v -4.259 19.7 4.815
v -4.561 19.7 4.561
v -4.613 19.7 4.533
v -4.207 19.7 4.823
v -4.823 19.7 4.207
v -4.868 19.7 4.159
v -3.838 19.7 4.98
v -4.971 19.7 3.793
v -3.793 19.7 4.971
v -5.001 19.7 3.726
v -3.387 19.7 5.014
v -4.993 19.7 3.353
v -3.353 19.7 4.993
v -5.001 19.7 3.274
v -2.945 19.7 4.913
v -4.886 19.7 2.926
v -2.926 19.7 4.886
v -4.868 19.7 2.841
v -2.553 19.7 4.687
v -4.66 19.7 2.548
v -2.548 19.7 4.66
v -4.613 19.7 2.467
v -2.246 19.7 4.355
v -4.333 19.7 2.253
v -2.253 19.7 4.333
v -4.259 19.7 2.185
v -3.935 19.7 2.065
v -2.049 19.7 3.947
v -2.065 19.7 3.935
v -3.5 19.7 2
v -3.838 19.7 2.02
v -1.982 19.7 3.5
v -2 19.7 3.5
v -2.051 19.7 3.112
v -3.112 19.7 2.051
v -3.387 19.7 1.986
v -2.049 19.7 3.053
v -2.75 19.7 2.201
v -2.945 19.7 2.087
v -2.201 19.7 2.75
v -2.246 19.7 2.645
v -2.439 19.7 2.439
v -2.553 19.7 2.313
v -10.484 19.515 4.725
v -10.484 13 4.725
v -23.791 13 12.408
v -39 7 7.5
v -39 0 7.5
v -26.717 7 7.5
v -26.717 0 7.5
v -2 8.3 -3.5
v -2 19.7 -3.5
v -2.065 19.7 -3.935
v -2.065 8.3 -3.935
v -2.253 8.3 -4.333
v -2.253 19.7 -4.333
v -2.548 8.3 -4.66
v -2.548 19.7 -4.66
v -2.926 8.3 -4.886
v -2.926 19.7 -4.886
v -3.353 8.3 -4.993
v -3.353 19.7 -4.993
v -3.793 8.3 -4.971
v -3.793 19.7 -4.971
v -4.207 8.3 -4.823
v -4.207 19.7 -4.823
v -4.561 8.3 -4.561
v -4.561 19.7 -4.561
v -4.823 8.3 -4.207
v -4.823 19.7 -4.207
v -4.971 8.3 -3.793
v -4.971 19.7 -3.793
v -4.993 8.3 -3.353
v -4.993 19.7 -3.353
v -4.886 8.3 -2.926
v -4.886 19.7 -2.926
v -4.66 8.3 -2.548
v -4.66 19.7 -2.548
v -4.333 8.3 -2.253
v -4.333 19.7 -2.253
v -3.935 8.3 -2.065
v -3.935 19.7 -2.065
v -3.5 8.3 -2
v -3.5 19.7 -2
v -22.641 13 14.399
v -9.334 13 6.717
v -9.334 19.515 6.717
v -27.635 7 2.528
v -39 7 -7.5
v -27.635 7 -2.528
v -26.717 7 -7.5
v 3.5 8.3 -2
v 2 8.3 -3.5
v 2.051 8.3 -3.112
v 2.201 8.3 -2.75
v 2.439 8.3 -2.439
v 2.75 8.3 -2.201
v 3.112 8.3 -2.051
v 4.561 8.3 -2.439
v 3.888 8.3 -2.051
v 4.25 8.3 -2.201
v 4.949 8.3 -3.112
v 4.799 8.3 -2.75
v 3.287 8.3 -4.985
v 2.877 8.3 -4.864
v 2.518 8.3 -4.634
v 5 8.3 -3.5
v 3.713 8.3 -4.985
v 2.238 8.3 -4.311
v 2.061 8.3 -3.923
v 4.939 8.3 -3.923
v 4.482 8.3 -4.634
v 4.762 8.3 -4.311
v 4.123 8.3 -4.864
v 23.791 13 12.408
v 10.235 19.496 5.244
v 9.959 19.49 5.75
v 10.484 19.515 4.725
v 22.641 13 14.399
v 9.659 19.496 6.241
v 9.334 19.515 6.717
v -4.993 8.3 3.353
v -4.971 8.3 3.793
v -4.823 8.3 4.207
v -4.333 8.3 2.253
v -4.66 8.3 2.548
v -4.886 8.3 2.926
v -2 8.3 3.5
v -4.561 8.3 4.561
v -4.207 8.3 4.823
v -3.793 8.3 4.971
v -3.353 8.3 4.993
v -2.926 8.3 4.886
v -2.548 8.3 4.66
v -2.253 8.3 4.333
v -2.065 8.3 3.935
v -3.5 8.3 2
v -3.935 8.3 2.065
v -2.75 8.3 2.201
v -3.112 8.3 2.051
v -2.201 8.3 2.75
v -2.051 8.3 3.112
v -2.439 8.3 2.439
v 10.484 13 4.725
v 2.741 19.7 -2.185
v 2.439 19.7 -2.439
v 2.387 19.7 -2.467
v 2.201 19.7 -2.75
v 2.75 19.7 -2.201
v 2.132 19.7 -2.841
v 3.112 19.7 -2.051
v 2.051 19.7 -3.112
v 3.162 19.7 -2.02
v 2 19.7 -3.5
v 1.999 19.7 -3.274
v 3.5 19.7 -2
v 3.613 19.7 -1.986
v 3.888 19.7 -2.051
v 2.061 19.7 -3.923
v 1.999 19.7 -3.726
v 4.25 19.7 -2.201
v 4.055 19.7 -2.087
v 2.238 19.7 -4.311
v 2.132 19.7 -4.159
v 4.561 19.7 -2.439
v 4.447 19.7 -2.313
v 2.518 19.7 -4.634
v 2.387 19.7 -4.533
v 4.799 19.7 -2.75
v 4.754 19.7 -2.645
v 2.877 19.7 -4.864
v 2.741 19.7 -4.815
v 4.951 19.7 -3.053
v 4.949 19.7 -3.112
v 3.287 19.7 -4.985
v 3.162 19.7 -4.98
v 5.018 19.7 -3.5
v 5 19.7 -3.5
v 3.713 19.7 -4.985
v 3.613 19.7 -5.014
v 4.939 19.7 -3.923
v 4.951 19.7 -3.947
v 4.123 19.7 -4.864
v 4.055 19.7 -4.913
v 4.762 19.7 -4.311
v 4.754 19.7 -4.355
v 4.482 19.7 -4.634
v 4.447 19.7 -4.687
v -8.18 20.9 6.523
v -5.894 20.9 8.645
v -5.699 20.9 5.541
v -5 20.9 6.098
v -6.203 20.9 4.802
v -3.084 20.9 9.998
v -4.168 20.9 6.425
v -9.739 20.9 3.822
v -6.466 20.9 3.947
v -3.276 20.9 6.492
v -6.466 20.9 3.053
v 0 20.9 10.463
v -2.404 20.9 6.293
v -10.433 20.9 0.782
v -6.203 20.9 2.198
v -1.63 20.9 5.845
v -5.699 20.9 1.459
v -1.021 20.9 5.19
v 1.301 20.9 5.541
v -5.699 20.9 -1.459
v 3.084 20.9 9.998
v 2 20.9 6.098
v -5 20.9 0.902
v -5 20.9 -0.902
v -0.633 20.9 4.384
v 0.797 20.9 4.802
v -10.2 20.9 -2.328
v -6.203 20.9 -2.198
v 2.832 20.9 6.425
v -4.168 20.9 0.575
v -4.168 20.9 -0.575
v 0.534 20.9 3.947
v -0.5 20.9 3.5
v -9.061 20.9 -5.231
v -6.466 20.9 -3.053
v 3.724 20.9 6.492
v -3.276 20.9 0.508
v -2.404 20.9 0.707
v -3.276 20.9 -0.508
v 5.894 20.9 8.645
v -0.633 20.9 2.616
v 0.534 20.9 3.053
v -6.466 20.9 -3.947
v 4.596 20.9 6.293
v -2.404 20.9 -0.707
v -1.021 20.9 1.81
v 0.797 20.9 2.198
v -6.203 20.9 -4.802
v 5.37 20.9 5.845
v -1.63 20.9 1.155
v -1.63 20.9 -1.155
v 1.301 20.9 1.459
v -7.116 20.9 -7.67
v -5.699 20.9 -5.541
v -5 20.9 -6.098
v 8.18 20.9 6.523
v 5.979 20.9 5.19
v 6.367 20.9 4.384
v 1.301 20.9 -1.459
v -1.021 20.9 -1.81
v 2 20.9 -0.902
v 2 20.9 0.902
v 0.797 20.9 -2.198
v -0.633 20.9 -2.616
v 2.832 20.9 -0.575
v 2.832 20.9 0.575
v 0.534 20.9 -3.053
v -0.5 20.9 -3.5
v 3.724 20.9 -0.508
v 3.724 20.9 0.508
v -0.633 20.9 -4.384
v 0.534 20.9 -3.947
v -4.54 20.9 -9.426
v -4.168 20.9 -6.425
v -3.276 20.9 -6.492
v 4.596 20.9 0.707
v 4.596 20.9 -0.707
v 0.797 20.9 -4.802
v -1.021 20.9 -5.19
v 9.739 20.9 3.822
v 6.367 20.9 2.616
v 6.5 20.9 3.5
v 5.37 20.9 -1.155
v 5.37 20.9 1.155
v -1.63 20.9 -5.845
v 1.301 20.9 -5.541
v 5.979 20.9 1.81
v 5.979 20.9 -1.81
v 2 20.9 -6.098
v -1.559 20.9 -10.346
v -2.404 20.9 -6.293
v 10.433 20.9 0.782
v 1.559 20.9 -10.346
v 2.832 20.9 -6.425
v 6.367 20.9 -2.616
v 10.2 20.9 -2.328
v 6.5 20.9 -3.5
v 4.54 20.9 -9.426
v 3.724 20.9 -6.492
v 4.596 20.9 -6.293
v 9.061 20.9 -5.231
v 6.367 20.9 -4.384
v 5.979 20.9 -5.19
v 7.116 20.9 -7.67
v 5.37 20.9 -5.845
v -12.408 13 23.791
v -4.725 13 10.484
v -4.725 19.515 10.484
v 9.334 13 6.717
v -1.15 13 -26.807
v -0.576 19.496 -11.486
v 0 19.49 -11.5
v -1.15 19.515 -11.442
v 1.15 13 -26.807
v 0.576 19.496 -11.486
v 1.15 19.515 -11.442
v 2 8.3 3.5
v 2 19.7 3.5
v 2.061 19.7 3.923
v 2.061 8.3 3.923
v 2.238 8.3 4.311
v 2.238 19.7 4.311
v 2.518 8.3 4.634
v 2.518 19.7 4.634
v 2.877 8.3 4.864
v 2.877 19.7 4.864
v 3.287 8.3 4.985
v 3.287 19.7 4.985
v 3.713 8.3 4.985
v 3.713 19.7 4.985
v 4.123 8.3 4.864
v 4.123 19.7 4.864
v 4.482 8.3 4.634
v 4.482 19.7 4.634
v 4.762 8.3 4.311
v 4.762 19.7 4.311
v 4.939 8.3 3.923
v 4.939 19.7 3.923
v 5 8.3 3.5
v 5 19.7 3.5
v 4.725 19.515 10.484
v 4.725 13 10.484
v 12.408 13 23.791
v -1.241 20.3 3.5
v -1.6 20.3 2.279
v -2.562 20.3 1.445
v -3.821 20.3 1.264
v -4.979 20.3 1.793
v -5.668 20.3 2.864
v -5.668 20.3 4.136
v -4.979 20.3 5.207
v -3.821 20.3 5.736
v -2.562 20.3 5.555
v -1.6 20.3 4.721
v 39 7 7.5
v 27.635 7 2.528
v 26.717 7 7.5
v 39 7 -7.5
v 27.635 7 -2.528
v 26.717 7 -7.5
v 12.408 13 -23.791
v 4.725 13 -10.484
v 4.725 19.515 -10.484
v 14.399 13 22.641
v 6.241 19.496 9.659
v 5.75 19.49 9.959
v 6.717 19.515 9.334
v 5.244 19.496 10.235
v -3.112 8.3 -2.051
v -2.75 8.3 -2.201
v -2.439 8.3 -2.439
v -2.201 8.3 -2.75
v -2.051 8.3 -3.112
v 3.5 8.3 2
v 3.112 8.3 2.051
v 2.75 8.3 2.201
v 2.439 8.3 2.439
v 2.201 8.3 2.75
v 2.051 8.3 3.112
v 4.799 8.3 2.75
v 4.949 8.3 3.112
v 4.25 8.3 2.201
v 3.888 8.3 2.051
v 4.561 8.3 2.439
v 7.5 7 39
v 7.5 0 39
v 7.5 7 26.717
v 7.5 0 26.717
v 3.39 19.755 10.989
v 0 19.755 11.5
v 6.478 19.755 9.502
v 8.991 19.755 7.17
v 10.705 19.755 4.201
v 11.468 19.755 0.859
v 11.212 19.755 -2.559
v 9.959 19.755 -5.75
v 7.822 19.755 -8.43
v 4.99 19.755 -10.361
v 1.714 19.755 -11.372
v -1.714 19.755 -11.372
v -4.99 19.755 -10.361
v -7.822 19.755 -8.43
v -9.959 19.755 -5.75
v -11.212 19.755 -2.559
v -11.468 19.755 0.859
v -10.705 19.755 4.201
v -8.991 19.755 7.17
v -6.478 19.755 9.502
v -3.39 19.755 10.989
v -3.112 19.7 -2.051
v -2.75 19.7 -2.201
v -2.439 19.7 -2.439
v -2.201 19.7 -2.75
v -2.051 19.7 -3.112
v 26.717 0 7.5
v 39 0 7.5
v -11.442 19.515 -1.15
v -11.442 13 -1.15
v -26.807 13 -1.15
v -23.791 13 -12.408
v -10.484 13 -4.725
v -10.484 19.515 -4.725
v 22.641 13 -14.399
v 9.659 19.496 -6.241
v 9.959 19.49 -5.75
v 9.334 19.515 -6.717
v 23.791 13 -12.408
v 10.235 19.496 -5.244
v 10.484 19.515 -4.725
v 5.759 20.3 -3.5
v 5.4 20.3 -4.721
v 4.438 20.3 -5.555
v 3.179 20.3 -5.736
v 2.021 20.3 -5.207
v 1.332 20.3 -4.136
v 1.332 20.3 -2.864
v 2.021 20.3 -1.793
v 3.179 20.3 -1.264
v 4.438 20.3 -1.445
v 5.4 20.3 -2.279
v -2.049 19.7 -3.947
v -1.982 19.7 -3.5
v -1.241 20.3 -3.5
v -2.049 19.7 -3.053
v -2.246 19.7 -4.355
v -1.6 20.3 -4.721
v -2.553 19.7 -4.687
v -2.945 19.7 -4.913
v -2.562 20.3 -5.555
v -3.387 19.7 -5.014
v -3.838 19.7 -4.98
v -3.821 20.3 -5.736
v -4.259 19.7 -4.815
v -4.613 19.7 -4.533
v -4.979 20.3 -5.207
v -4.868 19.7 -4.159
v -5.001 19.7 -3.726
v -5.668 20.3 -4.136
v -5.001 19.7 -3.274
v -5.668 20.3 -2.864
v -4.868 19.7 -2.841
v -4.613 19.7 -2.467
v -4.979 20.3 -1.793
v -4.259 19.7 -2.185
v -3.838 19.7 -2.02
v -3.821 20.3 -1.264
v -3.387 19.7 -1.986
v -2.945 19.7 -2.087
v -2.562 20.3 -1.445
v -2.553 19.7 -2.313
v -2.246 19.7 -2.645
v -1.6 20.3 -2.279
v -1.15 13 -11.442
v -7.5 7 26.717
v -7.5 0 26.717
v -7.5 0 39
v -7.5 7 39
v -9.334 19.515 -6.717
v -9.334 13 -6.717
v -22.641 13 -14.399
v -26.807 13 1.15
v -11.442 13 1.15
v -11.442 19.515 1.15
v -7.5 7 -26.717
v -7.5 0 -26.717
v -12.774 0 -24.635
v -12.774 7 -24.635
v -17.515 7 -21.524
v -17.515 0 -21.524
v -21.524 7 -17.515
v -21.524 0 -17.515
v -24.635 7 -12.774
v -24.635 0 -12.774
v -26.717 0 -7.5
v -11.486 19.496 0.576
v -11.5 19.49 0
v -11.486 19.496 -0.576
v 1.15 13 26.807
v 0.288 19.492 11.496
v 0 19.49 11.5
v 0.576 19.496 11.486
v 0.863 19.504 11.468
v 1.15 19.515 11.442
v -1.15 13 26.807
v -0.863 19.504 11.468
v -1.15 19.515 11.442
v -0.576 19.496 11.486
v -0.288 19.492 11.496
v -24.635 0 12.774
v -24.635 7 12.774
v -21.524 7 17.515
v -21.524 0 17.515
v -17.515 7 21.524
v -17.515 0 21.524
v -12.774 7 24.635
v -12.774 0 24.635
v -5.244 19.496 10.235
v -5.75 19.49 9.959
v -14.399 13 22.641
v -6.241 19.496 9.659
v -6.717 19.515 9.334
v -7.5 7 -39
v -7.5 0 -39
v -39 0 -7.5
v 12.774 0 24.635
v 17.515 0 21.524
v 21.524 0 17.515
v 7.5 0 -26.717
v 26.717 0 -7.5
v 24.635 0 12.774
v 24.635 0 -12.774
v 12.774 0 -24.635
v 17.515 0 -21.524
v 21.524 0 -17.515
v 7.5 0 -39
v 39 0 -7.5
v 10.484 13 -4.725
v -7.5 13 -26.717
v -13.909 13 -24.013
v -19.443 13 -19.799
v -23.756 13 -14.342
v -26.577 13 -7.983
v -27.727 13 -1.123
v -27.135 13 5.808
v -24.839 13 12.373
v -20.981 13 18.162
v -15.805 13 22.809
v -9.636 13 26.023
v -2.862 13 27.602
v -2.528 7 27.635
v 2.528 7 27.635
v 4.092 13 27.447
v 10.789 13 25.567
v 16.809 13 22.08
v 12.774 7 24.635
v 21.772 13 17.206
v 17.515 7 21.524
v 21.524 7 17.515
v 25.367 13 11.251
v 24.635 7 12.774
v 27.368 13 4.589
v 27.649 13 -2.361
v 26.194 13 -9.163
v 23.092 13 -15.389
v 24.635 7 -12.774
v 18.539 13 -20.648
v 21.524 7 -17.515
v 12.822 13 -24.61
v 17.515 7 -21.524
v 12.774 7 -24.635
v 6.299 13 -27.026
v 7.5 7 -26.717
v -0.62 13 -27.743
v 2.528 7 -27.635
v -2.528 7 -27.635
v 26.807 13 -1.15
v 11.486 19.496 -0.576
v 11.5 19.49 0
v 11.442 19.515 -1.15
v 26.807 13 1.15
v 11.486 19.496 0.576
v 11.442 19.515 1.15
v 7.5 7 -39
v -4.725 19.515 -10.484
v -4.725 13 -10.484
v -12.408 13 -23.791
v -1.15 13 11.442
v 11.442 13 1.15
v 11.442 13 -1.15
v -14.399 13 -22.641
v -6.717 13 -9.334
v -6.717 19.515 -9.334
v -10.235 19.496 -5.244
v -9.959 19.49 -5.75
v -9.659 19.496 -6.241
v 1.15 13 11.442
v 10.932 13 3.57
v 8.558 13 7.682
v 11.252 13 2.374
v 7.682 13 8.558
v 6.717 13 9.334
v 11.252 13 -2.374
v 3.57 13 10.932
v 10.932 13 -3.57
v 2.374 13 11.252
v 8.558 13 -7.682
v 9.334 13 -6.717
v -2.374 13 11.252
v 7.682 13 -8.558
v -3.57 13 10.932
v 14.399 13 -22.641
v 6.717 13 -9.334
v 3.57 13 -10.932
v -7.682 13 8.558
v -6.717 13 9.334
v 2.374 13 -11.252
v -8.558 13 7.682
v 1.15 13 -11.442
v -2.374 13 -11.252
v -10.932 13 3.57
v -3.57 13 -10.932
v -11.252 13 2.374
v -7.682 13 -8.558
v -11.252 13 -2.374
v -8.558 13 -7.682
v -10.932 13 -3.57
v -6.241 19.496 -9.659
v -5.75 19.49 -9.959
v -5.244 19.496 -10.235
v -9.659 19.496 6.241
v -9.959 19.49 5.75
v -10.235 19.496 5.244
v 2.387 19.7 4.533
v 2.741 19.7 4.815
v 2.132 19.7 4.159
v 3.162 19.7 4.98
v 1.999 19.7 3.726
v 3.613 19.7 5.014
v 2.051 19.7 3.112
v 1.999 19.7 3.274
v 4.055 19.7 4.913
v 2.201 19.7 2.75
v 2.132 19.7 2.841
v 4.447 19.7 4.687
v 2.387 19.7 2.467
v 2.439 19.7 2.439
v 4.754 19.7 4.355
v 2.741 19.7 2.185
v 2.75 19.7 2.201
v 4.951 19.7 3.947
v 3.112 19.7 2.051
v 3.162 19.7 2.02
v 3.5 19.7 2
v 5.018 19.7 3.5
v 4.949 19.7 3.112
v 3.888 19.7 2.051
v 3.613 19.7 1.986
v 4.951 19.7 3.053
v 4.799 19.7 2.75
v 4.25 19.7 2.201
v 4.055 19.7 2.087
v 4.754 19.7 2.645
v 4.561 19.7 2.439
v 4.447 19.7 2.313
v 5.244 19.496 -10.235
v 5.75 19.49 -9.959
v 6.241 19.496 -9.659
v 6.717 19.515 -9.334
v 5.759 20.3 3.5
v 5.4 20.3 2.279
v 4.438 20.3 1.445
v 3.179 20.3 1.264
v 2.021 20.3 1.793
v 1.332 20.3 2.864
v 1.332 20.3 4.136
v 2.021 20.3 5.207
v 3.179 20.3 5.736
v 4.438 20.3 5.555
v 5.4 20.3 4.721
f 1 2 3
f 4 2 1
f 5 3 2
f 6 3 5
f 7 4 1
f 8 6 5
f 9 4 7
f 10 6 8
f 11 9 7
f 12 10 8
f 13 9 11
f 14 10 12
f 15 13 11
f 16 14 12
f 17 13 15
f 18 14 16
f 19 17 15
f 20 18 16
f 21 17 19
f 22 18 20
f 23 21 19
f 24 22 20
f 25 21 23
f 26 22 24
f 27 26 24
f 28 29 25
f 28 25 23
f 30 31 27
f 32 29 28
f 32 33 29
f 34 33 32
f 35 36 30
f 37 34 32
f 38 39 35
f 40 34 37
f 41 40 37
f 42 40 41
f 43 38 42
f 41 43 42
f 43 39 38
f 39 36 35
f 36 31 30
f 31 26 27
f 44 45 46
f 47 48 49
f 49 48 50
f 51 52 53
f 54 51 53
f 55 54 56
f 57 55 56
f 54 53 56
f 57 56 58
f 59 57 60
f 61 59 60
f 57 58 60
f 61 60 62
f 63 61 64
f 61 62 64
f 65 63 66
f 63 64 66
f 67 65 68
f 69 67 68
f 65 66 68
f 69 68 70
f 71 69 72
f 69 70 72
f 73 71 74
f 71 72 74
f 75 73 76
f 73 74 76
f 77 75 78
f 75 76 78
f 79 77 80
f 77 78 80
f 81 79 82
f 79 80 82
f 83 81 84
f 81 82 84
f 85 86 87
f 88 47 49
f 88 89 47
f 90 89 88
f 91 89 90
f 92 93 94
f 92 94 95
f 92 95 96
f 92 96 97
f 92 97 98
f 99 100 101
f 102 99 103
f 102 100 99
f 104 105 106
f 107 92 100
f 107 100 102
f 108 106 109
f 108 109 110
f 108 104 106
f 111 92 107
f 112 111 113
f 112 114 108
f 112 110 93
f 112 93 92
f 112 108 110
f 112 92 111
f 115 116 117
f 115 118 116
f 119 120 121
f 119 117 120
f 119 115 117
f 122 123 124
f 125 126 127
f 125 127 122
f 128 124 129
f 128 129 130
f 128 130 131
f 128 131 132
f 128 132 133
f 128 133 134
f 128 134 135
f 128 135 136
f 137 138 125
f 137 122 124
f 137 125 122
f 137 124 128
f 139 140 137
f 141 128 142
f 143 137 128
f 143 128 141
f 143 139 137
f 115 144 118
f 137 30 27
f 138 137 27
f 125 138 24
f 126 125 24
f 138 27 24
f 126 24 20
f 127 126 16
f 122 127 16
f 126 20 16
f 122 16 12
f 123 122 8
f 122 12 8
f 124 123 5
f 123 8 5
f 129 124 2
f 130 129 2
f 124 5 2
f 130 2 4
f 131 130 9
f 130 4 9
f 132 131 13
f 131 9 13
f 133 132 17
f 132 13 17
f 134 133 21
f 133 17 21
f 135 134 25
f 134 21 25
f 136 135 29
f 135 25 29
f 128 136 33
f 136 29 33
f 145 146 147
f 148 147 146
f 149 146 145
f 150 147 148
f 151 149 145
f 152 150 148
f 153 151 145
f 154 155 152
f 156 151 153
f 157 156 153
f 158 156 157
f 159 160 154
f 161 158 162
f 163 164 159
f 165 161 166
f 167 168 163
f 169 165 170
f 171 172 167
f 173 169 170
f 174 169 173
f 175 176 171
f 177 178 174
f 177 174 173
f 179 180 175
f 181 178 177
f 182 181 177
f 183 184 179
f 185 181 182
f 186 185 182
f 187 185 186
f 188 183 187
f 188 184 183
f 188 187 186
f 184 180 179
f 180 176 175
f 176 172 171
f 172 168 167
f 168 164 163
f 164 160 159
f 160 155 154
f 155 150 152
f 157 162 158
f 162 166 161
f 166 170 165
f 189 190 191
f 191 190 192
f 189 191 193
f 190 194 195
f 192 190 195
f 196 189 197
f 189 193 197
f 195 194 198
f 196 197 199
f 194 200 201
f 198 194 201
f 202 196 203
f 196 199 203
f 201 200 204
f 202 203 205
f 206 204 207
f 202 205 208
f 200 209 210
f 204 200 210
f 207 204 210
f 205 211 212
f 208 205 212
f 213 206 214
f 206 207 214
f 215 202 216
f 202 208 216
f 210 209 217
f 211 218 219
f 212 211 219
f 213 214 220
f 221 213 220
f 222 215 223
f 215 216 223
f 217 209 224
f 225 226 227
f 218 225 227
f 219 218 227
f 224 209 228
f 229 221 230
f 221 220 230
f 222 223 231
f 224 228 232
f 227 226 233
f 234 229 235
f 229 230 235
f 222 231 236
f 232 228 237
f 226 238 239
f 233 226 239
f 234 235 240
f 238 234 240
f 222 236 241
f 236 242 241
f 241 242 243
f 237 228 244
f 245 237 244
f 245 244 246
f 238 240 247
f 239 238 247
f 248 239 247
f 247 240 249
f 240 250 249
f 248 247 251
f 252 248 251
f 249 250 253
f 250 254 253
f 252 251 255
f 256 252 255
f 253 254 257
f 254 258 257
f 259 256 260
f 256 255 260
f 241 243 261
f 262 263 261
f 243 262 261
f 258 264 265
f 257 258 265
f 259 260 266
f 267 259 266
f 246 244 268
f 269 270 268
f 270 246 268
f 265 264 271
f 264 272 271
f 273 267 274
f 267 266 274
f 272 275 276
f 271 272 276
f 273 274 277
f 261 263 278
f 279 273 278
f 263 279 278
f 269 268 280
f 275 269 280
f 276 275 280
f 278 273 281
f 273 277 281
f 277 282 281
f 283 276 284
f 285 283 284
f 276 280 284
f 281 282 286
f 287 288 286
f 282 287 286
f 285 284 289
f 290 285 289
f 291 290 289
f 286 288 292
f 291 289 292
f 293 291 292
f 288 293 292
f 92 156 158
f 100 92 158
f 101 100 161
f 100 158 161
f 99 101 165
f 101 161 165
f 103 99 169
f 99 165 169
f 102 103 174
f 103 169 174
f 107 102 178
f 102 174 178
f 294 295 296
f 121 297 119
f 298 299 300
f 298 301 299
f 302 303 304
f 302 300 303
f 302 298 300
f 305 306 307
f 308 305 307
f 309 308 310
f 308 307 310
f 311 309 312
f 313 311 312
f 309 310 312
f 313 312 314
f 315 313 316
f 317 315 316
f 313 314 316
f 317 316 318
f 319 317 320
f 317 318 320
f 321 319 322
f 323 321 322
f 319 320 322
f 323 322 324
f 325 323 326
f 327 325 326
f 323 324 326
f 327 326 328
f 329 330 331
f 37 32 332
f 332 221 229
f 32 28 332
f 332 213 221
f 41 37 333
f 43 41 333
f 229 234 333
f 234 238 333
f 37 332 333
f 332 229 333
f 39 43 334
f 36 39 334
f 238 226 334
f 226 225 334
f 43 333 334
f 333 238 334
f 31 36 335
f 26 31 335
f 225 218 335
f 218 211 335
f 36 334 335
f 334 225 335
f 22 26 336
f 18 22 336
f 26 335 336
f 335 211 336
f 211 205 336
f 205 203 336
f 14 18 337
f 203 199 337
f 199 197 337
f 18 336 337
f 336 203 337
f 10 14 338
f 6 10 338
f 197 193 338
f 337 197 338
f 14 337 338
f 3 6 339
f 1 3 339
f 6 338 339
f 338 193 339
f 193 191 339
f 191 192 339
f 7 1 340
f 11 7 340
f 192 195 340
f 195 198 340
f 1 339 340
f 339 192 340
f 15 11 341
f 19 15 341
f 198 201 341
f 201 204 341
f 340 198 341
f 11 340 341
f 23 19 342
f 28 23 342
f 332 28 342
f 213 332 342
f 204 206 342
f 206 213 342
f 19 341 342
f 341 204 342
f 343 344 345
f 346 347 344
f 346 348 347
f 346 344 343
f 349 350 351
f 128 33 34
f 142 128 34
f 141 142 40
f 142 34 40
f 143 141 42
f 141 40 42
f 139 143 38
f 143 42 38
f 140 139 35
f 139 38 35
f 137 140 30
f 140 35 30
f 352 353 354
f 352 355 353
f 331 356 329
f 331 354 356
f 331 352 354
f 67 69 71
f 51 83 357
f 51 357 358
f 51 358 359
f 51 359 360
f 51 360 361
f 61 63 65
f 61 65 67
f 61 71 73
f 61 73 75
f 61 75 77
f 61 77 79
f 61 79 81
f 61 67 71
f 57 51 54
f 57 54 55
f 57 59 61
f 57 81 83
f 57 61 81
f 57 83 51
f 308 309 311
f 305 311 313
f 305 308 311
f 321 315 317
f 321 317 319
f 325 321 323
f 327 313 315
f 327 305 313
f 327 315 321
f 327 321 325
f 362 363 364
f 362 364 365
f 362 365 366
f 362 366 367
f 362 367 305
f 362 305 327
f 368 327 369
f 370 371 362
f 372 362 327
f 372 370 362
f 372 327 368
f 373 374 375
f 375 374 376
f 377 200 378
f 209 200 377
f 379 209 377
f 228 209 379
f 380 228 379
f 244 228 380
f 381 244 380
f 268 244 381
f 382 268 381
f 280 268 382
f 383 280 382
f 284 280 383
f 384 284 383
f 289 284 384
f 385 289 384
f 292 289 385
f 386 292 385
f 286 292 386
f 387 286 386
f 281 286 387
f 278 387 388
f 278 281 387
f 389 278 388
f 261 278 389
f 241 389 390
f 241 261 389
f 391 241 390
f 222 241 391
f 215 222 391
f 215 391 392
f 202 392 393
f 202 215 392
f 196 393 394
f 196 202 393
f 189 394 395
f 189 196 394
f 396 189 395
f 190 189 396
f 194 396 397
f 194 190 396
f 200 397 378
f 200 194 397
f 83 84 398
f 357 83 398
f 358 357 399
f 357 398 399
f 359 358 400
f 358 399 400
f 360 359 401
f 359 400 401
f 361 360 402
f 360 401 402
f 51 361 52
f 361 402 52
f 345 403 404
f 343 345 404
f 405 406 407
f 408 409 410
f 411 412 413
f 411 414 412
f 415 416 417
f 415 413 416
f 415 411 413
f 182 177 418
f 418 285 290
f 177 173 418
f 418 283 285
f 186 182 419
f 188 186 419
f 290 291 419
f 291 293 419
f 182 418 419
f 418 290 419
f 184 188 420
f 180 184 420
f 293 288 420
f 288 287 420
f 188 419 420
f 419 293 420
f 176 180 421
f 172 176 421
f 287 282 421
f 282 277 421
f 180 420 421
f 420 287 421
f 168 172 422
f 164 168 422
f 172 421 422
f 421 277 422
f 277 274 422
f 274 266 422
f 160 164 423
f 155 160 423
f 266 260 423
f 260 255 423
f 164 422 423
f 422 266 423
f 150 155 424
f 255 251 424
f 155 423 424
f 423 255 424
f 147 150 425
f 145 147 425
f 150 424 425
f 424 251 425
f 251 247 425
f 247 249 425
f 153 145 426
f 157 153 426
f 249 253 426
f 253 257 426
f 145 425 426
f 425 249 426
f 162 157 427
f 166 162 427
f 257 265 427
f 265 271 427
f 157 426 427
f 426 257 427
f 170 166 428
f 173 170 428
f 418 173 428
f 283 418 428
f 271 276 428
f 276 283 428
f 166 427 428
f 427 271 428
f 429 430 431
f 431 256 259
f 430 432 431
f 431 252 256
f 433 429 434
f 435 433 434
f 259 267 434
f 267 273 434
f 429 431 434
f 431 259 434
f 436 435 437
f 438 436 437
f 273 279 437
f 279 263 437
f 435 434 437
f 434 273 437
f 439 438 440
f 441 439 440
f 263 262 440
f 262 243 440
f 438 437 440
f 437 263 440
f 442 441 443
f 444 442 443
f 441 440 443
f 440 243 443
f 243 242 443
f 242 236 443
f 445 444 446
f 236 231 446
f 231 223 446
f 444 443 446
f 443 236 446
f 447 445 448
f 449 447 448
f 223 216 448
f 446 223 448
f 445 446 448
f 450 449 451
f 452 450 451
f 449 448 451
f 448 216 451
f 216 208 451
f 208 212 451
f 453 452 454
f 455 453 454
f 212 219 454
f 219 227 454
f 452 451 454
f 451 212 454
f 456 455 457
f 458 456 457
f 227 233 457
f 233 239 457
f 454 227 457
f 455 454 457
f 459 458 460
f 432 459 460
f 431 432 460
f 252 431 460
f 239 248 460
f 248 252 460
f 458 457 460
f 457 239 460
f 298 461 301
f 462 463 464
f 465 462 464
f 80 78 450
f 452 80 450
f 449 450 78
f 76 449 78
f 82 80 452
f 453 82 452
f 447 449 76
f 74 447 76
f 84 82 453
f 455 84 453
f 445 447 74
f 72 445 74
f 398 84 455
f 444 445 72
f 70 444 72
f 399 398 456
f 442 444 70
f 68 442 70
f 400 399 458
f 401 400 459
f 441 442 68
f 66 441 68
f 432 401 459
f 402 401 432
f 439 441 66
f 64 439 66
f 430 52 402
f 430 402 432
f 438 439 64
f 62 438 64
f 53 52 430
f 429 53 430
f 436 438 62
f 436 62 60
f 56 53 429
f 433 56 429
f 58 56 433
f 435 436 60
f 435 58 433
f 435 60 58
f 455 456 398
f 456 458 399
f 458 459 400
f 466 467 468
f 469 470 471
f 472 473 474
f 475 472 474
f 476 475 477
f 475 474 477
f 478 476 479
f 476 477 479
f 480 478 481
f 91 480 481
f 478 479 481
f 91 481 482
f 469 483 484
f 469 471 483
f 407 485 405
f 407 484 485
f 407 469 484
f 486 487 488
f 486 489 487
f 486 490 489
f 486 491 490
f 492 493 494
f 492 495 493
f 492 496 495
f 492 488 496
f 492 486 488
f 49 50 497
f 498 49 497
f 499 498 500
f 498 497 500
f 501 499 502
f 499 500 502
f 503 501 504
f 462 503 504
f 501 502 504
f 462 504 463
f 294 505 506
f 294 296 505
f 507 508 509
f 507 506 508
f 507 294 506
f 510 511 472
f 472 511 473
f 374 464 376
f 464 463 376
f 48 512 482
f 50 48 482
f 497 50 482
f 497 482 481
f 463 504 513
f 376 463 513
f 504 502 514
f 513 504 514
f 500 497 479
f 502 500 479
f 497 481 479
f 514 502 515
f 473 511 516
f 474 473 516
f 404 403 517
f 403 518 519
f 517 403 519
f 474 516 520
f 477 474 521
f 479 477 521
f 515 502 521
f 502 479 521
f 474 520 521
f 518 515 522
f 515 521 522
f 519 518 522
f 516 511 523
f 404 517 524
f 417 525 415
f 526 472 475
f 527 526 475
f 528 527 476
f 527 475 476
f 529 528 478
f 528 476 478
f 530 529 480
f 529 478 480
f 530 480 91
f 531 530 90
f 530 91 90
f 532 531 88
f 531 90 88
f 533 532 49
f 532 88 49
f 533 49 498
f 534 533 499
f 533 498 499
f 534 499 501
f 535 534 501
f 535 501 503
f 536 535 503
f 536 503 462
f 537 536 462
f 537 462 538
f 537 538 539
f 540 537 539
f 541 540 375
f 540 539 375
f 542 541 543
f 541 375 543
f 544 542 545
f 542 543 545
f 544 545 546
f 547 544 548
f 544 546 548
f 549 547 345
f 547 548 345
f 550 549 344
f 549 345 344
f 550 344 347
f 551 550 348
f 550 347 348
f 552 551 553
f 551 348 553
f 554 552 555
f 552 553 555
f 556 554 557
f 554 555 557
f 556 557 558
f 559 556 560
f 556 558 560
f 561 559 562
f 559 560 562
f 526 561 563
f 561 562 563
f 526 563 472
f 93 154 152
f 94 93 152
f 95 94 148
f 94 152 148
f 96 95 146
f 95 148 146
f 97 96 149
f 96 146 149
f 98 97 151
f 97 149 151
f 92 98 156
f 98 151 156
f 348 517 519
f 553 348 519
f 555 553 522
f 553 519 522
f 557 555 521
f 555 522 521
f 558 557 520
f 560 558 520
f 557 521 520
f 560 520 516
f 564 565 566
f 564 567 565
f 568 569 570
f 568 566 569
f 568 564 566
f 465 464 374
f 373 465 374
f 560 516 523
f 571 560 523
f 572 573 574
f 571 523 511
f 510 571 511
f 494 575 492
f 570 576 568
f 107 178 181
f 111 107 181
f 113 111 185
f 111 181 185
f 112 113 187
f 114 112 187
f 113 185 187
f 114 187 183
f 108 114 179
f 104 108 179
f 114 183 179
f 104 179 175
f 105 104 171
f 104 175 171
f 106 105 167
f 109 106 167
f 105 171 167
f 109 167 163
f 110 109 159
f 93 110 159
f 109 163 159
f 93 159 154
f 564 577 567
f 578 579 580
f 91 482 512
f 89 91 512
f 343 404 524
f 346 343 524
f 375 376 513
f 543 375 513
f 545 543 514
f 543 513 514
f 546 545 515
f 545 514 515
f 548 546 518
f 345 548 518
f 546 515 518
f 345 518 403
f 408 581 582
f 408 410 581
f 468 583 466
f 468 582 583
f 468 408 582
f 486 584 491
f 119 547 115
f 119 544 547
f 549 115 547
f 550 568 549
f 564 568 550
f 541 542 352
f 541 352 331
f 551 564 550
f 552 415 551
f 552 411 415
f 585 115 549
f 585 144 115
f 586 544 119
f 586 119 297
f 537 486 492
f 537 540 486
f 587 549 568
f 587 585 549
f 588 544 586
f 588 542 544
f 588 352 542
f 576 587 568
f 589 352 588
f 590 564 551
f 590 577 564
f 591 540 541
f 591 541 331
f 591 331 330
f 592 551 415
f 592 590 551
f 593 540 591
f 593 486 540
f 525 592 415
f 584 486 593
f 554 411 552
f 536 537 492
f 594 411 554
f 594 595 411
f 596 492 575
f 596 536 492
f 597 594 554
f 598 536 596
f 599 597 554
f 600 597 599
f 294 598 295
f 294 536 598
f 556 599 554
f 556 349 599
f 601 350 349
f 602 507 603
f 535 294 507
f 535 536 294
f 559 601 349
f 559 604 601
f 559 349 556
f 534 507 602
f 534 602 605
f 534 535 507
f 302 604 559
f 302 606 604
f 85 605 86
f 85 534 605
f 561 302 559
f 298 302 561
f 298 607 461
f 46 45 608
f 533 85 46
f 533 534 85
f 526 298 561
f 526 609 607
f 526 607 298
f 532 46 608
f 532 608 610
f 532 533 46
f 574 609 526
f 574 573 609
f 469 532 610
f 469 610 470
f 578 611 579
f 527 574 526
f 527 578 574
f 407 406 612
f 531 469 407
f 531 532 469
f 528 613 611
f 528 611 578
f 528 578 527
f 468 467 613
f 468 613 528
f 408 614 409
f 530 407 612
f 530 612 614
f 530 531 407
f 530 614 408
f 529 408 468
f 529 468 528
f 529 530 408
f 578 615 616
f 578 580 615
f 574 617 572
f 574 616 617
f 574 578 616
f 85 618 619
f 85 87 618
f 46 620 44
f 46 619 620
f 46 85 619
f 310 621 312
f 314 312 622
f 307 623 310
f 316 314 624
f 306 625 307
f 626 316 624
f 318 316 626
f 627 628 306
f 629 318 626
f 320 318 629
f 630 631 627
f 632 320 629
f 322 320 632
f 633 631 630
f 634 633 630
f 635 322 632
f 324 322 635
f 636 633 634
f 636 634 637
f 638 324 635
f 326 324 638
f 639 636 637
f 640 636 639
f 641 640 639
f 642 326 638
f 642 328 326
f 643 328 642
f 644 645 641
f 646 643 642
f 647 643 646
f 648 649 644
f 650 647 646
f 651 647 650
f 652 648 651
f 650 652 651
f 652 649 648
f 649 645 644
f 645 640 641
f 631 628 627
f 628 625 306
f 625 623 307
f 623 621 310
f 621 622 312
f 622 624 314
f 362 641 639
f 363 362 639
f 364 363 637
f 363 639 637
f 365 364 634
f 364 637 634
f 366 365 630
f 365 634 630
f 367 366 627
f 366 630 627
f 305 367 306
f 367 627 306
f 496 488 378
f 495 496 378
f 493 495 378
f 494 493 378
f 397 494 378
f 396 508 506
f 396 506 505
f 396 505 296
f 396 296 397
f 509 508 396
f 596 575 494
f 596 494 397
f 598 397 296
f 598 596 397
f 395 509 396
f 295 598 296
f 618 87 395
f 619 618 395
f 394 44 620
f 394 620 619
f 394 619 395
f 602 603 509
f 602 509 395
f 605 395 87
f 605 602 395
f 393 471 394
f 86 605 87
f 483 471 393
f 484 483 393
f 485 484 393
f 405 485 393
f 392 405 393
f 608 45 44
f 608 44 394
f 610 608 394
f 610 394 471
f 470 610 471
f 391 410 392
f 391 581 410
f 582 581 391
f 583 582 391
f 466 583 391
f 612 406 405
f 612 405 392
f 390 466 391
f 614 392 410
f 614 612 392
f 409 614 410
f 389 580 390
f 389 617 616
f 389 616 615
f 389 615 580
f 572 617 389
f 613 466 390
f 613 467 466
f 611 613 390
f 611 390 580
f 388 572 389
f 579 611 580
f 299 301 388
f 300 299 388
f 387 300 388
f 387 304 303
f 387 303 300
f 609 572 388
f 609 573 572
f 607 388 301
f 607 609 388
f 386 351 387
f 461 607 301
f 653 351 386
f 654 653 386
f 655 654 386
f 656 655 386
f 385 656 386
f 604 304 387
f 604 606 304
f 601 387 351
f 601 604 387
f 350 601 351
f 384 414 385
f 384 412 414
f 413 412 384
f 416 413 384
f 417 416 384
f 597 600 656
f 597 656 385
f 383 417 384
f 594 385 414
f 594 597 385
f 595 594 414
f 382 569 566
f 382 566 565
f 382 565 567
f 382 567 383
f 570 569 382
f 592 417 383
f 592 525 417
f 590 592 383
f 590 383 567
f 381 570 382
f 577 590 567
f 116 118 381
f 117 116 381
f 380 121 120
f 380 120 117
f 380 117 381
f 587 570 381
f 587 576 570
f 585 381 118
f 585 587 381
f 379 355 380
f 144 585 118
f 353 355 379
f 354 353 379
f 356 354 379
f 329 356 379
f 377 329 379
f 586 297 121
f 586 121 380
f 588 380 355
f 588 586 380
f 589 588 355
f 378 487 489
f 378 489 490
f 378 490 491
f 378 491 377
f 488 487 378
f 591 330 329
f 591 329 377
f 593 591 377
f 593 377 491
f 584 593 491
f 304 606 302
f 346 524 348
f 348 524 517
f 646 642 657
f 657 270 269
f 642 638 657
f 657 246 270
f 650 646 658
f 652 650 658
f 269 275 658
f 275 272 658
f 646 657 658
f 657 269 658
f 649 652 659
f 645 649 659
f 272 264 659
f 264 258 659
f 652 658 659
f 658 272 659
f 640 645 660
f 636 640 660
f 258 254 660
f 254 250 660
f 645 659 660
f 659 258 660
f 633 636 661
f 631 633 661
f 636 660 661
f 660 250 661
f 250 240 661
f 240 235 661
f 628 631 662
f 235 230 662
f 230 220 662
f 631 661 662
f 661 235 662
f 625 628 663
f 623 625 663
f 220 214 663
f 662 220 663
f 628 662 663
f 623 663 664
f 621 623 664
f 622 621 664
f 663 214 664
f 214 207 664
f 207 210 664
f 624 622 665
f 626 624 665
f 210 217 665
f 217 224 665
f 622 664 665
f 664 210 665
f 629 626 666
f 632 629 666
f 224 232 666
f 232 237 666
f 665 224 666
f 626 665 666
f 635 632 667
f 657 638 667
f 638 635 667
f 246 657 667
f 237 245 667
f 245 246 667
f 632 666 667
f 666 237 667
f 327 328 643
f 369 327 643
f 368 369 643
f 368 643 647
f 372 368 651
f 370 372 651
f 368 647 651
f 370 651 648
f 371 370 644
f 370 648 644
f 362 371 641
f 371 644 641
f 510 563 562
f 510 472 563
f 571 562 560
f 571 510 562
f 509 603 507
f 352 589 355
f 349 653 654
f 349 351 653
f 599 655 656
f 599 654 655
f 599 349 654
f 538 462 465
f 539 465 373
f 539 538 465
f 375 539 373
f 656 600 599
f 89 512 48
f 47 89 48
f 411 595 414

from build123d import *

# Parameters (mm, degrees)
SALIENTE_EXTRUIR1_DEPTH         = 7
CROQUIS2_R                      = 27.75
SALIENTE_EXTRUIR2_DEPTH         = 6
CROQUIS3_R                      = 11.5
SALIENTE_EXTRUIR3_DEPTH         = 6.7
NERVIO5_START                   = -19.605376538
NERVIO5_OUTLINE_W               = 2.3
NERVIO5_OUTLINE_H               = 7.43309969
NERVIO5_DEPTH                   = 16.688717133
MATRIZC1_COUNT                  = 12
CROQUIS5_R                      = 8.65
SALIENTE_EXTRUIR4_DEPTH         = 1.2
CHAFL_N1_SIZE                   = 2.9
CHAFL_N1_SIZE_2                 = 3.2
CORTAR_EXTRUIR1_DEPTH           = 12.6
CROQUIS7_R                      = 3
CORTAR_EXTRUIR2_DEPTH           = 1.2
CORTAR_EXTRUIR2_DRAFT           = -51
CORTAR_EXTRUIR2_PROFILE_2_DEPTH = 1.2
CORTAR_EXTRUIR2_PROFILE_2_DRAFT = -51
CORTAR_EXTRUIR2_PROFILE_3_DEPTH = 1.2
CORTAR_EXTRUIR2_PROFILE_3_DRAFT = -51
CORTAR_EXTRUIR2_PROFILE_4_DEPTH = 1.2
CORTAR_EXTRUIR2_PROFILE_4_DRAFT = -51


# Read off the part's stored shape, not the designer's step: Nervio5
with BuildPart() as part:
    # Croquis1 → Saliente-Extruir1 (new body)
    with BuildSketch(Plane(origin=(0, 0, 0), x_dir=(1, 0, 0), z_dir=(0, 1, 0))):
        with BuildLine():
            Line((-7.5, -39), (7.5, -39))
            Line((7.5, -39), (7.5, -26.717269696))
            ThreePointArc((7.5, -26.717269696), (19.622213178, -19.622213178), (26.717269696, -7.5))
            Line((26.717269696, -7.5), (39, -7.5))
            Line((39, -7.5), (39, 7.5))
            Line((39, 7.5), (26.717269696, 7.5))
            ThreePointArc((26.717269696, 7.5), (19.622213178, 19.622213178), (7.5, 26.717269696))
            Line((7.5, 26.717269696), (7.5, 39))
            Line((7.5, 39), (-7.5, 39))
            Line((-7.5, 39), (-7.5, 26.717269696))
            ThreePointArc((-7.5, 26.717269696), (-19.622213178, 19.622213178), (-26.717269696, 7.5))
            Line((-26.717269696, 7.5), (-39, 7.5))
            Line((-39, 7.5), (-39, -7.5))
            Line((-39, -7.5), (-26.717269696, -7.5))
            ThreePointArc((-26.717269696, -7.5), (-19.622213178, -19.622213178), (-7.5, -26.717269696))
            Line((-7.5, -26.717269696), (-7.5, -39))
        make_face()
    extrude(amount=SALIENTE_EXTRUIR1_DEPTH)

    # Croquis2 → Saliente-Extruir2 (add)
    with BuildSketch(Plane(origin=(0, 7, 0), x_dir=(1, 0, 0), z_dir=(0, 1, 0))):
        with Locations(Location((0, 0, 0), (0, 0, 105.680350135))):
            Circle(CROQUIS2_R)
    extrude(amount=SALIENTE_EXTRUIR2_DEPTH)

    # Croquis3 → Saliente-Extruir3 (add)
    with BuildSketch(Plane(origin=(0, 13, 0), x_dir=(1, 0, 0), z_dir=(0, 1, 0))):
        with Locations(Location((0, 0, 0), (0, 0, 270))):
            Circle(CROQUIS3_R)
    extrude(amount=SALIENTE_EXTRUIR3_DEPTH)

    # Nervio5 outline → Nervio5 (add)
    with BuildSketch(Plane(origin=(0, 0, 0), x_dir=(1, 0, 0), z_dir=(0, 0.39036530164811784, 0.9206600519568415)).offset(NERVIO5_START)):
        with Locations((0, 18.716549845)):
            Rectangle(NERVIO5_OUTLINE_W, NERVIO5_OUTLINE_H)
    nervio5 = extrude(amount=NERVIO5_DEPTH)

    # MatrizC1: Nervio5 ×12 about axis
    matrizc1_axis = Axis((0, 0, 0), (0, 1, 0))
    for i in range(1, MATRIZC1_COUNT):
        add(nervio5.rotate(matrizc1_axis, i * 360 / MATRIZC1_COUNT))

    # Croquis5 → Saliente-Extruir4 (add)
    with BuildSketch(Plane(origin=(0, 19.7, 0), x_dir=(1, 0, 0), z_dir=(0, 1, 0))):
        with Locations(Location((0, 0, 0), (0, 0, 270))):
            Circle(CROQUIS5_R)
    extrude(amount=SALIENTE_EXTRUIR4_DEPTH)

    # Chaflán1
    # the kernel refuses this chamfer: 3.2, 2.9 mm, written as the material it adds along each edge
    with BuildSketch(Plane(origin=(0, 19.7, 0), x_dir=(0, 0, 1), z_dir=(-1, 0, 0))) as chafl_n1_piece_1_section:
        Polygon((8.65 + CHAFL_N1_SIZE, 0), (8.65, CHAFL_N1_SIZE_2), (8.65, 0), align=None)
    chafl_n1_piece_1 = revolve(axis=Axis((0, 19.7, 0), (0, 1, 0)), mode=Mode.PRIVATE)
    chafl_n1_piece_1 = chafl_n1_piece_1 & Plane(origin=(0, 20.288796189, 0), x_dir=(0, 0, 1), z_dir=(0, -1, 0)) * Cylinder(11.5, 47, mode=Mode.PRIVATE)
    chafl_n1_piece_1 = split(chafl_n1_piece_1, bisect_by=Plane(origin=(0, 20.9, -10.938447221), z_dir=(0, -1, 0)), keep=Keep.TOP, mode=Mode.PRIVATE)
    add(chafl_n1_piece_1)

    # Croquis6 → Cortar-Extruir1 (cut)
    with BuildSketch(Plane(origin=(0, 20.9, 0), x_dir=(1, 0, 0), z_dir=(0, 1, 0))):
        with BuildLine():
            ThreePointArc((-2, 3.5), (-4.560660172, 4.560660172), (-3.5, 2))
            Line((-3.5, 2), (-3.5, 3.5))
            Line((-3.5, 3.5), (-2, 3.5))
        make_face()
        with BuildLine():
            Line((-3.5, 3.5), (-3.5, 2))
            ThreePointArc((-3.5, 2), (-2.439339828, 2.439339828), (-2, 3.5))
            Line((-2, 3.5), (-3.5, 3.5))
        make_face()
        with BuildLine():
            ThreePointArc((2, 3.5), (2.439339828, 2.439339828), (3.5, 2))
            Line((3.5, 2), (3.5, 3.5))
            Line((3.5, 3.5), (2, 3.5))
        make_face()
        with BuildLine():
            Line((3.5, 3.5), (3.5, 2))
            ThreePointArc((3.5, 2), (4.560660172, 2.439339828), (5, 3.5))
            ThreePointArc((5, 3.5), (3.5, 5), (2, 3.5))
            Line((2, 3.5), (3.5, 3.5))
        make_face()
        with BuildLine():
            ThreePointArc((3.5, -2), (2.439339828, -2.439339828), (2, -3.5))
            Line((2, -3.5), (3.5, -3.5))
            Line((3.5, -3.5), (3.5, -2))
        make_face()
        with BuildLine():
            Line((3.5, -3.5), (2, -3.5))
            ThreePointArc((2, -3.5), (3.5, -5), (5, -3.5))
            ThreePointArc((5, -3.5), (4.560660172, -2.439339828), (3.5, -2))
            Line((3.5, -2), (3.5, -3.5))
        make_face()
        with BuildLine():
            Line((-3.5, -2), (-3.5, -3.5))
            Line((-3.5, -3.5), (-2, -3.5))
            ThreePointArc((-2, -3.5), (-2.439339828, -2.439339828), (-3.5, -2))
        make_face()
        with BuildLine():
            Line((-2, -3.5), (-3.5, -3.5))
            Line((-3.5, -3.5), (-3.5, -2))
            ThreePointArc((-3.5, -2), (-4.560660172, -4.560660172), (-2, -3.5))
        make_face()
    extrude(amount=-CORTAR_EXTRUIR1_DEPTH, mode=Mode.SUBTRACT)


with BuildPart() as cortar_extruir2_tool:
    # Croquis7 → Cortar-Extruir2 (with draft: the straight prism first)
    with BuildSketch(Plane(origin=(0, 20.9, 0), x_dir=(1, 0, 0), z_dir=(0, 1, 0))):
        with Locations((-3.5, 3.5)):
            Circle(CROQUIS7_R)
    extrude(amount=-CORTAR_EXTRUIR2_DEPTH)
    # Cortar-Extruir2: the draft: its side faces are tilted about the plane it starts from
    cortar_extruir2_sides = [cortar_extruir2_tool.faces().sort_by_distance(p)[0] for p in [
        (-6.5, 20.3, -3.5),
    ]]
    draft(cortar_extruir2_sides, Plane(origin=(0, 20.9, 0), x_dir=(1, 0, 0), z_dir=(0, 1, 0)), CORTAR_EXTRUIR2_DRAFT)


with BuildPart() as part_1:
    add(part.part)

    # Cortar-Extruir2: cut by cortar_extruir2_tool
    add(cortar_extruir2_tool.part, mode=Mode.SUBTRACT)


with BuildPart() as cortar_extruir2_profile_2_tool:
    # Croquis7 → Cortar-Extruir2 profile 2 (with draft: the straight prism first)
    with BuildSketch(Plane(origin=(0, 20.9, 0), x_dir=(1, 0, 0), z_dir=(0, 1, 0))):
        with Locations((3.5, 3.5)):
            Circle(CROQUIS7_R)
    extrude(amount=-CORTAR_EXTRUIR2_PROFILE_2_DEPTH)
    # Cortar-Extruir2 profile 2: the draft: its side faces are tilted about the plane it starts from
    cortar_extruir2_profile_2_sides = [cortar_extruir2_profile_2_tool.faces().sort_by_distance(p)[0] for p in [
        (0.5, 20.3, -3.5),
    ]]
    draft(cortar_extruir2_profile_2_sides, Plane(origin=(0, 20.9, 0), x_dir=(1, 0, 0), z_dir=(0, 1, 0)), CORTAR_EXTRUIR2_PROFILE_2_DRAFT)


with BuildPart() as part_2:
    add(part_1.part)

    # Cortar-Extruir2 profile 2: cut by cortar_extruir2_profile_2_tool
    add(cortar_extruir2_profile_2_tool.part, mode=Mode.SUBTRACT)


with BuildPart() as cortar_extruir2_profile_3_tool:
    # Croquis7 → Cortar-Extruir2 profile 3 (with draft: the straight prism first)
    with BuildSketch(Plane(origin=(0, 20.9, 0), x_dir=(1, 0, 0), z_dir=(0, 1, 0))):
        with Locations((3.5, -3.5)):
            Circle(CROQUIS7_R)
    extrude(amount=-CORTAR_EXTRUIR2_PROFILE_3_DEPTH)
    # Cortar-Extruir2 profile 3: the draft: its side faces are tilted about the plane it starts from
    cortar_extruir2_profile_3_sides = [cortar_extruir2_profile_3_tool.faces().sort_by_distance(p)[0] for p in [
        (0.5, 20.3, 3.5),
    ]]
    draft(cortar_extruir2_profile_3_sides, Plane(origin=(0, 20.9, 0), x_dir=(1, 0, 0), z_dir=(0, 1, 0)), CORTAR_EXTRUIR2_PROFILE_3_DRAFT)


with BuildPart() as part_3:
    add(part_2.part)

    # Cortar-Extruir2 profile 3: cut by cortar_extruir2_profile_3_tool
    add(cortar_extruir2_profile_3_tool.part, mode=Mode.SUBTRACT)


with BuildPart() as cortar_extruir2_profile_4_tool:
    # Croquis7 → Cortar-Extruir2 profile 4 (with draft: the straight prism first)
    with BuildSketch(Plane(origin=(0, 20.9, 0), x_dir=(1, 0, 0), z_dir=(0, 1, 0))):
        with Locations((-3.5, -3.5)):
            Circle(CROQUIS7_R)
    extrude(amount=-CORTAR_EXTRUIR2_PROFILE_4_DEPTH)
    # Cortar-Extruir2 profile 4: the draft: its side faces are tilted about the plane it starts from
    cortar_extruir2_profile_4_sides = [cortar_extruir2_profile_4_tool.faces().sort_by_distance(p)[0] for p in [
        (-6.5, 20.3, 3.5),
    ]]
    draft(cortar_extruir2_profile_4_sides, Plane(origin=(0, 20.9, 0), x_dir=(1, 0, 0), z_dir=(0, 1, 0)), CORTAR_EXTRUIR2_PROFILE_4_DRAFT)


with BuildPart() as part_4:
    add(part_3.part)

    # Cortar-Extruir2 profile 4: cut by cortar_extruir2_profile_4_tool
    add(cortar_extruir2_profile_4_tool.part, mode=Mode.SUBTRACT)


solid = part_4.part
